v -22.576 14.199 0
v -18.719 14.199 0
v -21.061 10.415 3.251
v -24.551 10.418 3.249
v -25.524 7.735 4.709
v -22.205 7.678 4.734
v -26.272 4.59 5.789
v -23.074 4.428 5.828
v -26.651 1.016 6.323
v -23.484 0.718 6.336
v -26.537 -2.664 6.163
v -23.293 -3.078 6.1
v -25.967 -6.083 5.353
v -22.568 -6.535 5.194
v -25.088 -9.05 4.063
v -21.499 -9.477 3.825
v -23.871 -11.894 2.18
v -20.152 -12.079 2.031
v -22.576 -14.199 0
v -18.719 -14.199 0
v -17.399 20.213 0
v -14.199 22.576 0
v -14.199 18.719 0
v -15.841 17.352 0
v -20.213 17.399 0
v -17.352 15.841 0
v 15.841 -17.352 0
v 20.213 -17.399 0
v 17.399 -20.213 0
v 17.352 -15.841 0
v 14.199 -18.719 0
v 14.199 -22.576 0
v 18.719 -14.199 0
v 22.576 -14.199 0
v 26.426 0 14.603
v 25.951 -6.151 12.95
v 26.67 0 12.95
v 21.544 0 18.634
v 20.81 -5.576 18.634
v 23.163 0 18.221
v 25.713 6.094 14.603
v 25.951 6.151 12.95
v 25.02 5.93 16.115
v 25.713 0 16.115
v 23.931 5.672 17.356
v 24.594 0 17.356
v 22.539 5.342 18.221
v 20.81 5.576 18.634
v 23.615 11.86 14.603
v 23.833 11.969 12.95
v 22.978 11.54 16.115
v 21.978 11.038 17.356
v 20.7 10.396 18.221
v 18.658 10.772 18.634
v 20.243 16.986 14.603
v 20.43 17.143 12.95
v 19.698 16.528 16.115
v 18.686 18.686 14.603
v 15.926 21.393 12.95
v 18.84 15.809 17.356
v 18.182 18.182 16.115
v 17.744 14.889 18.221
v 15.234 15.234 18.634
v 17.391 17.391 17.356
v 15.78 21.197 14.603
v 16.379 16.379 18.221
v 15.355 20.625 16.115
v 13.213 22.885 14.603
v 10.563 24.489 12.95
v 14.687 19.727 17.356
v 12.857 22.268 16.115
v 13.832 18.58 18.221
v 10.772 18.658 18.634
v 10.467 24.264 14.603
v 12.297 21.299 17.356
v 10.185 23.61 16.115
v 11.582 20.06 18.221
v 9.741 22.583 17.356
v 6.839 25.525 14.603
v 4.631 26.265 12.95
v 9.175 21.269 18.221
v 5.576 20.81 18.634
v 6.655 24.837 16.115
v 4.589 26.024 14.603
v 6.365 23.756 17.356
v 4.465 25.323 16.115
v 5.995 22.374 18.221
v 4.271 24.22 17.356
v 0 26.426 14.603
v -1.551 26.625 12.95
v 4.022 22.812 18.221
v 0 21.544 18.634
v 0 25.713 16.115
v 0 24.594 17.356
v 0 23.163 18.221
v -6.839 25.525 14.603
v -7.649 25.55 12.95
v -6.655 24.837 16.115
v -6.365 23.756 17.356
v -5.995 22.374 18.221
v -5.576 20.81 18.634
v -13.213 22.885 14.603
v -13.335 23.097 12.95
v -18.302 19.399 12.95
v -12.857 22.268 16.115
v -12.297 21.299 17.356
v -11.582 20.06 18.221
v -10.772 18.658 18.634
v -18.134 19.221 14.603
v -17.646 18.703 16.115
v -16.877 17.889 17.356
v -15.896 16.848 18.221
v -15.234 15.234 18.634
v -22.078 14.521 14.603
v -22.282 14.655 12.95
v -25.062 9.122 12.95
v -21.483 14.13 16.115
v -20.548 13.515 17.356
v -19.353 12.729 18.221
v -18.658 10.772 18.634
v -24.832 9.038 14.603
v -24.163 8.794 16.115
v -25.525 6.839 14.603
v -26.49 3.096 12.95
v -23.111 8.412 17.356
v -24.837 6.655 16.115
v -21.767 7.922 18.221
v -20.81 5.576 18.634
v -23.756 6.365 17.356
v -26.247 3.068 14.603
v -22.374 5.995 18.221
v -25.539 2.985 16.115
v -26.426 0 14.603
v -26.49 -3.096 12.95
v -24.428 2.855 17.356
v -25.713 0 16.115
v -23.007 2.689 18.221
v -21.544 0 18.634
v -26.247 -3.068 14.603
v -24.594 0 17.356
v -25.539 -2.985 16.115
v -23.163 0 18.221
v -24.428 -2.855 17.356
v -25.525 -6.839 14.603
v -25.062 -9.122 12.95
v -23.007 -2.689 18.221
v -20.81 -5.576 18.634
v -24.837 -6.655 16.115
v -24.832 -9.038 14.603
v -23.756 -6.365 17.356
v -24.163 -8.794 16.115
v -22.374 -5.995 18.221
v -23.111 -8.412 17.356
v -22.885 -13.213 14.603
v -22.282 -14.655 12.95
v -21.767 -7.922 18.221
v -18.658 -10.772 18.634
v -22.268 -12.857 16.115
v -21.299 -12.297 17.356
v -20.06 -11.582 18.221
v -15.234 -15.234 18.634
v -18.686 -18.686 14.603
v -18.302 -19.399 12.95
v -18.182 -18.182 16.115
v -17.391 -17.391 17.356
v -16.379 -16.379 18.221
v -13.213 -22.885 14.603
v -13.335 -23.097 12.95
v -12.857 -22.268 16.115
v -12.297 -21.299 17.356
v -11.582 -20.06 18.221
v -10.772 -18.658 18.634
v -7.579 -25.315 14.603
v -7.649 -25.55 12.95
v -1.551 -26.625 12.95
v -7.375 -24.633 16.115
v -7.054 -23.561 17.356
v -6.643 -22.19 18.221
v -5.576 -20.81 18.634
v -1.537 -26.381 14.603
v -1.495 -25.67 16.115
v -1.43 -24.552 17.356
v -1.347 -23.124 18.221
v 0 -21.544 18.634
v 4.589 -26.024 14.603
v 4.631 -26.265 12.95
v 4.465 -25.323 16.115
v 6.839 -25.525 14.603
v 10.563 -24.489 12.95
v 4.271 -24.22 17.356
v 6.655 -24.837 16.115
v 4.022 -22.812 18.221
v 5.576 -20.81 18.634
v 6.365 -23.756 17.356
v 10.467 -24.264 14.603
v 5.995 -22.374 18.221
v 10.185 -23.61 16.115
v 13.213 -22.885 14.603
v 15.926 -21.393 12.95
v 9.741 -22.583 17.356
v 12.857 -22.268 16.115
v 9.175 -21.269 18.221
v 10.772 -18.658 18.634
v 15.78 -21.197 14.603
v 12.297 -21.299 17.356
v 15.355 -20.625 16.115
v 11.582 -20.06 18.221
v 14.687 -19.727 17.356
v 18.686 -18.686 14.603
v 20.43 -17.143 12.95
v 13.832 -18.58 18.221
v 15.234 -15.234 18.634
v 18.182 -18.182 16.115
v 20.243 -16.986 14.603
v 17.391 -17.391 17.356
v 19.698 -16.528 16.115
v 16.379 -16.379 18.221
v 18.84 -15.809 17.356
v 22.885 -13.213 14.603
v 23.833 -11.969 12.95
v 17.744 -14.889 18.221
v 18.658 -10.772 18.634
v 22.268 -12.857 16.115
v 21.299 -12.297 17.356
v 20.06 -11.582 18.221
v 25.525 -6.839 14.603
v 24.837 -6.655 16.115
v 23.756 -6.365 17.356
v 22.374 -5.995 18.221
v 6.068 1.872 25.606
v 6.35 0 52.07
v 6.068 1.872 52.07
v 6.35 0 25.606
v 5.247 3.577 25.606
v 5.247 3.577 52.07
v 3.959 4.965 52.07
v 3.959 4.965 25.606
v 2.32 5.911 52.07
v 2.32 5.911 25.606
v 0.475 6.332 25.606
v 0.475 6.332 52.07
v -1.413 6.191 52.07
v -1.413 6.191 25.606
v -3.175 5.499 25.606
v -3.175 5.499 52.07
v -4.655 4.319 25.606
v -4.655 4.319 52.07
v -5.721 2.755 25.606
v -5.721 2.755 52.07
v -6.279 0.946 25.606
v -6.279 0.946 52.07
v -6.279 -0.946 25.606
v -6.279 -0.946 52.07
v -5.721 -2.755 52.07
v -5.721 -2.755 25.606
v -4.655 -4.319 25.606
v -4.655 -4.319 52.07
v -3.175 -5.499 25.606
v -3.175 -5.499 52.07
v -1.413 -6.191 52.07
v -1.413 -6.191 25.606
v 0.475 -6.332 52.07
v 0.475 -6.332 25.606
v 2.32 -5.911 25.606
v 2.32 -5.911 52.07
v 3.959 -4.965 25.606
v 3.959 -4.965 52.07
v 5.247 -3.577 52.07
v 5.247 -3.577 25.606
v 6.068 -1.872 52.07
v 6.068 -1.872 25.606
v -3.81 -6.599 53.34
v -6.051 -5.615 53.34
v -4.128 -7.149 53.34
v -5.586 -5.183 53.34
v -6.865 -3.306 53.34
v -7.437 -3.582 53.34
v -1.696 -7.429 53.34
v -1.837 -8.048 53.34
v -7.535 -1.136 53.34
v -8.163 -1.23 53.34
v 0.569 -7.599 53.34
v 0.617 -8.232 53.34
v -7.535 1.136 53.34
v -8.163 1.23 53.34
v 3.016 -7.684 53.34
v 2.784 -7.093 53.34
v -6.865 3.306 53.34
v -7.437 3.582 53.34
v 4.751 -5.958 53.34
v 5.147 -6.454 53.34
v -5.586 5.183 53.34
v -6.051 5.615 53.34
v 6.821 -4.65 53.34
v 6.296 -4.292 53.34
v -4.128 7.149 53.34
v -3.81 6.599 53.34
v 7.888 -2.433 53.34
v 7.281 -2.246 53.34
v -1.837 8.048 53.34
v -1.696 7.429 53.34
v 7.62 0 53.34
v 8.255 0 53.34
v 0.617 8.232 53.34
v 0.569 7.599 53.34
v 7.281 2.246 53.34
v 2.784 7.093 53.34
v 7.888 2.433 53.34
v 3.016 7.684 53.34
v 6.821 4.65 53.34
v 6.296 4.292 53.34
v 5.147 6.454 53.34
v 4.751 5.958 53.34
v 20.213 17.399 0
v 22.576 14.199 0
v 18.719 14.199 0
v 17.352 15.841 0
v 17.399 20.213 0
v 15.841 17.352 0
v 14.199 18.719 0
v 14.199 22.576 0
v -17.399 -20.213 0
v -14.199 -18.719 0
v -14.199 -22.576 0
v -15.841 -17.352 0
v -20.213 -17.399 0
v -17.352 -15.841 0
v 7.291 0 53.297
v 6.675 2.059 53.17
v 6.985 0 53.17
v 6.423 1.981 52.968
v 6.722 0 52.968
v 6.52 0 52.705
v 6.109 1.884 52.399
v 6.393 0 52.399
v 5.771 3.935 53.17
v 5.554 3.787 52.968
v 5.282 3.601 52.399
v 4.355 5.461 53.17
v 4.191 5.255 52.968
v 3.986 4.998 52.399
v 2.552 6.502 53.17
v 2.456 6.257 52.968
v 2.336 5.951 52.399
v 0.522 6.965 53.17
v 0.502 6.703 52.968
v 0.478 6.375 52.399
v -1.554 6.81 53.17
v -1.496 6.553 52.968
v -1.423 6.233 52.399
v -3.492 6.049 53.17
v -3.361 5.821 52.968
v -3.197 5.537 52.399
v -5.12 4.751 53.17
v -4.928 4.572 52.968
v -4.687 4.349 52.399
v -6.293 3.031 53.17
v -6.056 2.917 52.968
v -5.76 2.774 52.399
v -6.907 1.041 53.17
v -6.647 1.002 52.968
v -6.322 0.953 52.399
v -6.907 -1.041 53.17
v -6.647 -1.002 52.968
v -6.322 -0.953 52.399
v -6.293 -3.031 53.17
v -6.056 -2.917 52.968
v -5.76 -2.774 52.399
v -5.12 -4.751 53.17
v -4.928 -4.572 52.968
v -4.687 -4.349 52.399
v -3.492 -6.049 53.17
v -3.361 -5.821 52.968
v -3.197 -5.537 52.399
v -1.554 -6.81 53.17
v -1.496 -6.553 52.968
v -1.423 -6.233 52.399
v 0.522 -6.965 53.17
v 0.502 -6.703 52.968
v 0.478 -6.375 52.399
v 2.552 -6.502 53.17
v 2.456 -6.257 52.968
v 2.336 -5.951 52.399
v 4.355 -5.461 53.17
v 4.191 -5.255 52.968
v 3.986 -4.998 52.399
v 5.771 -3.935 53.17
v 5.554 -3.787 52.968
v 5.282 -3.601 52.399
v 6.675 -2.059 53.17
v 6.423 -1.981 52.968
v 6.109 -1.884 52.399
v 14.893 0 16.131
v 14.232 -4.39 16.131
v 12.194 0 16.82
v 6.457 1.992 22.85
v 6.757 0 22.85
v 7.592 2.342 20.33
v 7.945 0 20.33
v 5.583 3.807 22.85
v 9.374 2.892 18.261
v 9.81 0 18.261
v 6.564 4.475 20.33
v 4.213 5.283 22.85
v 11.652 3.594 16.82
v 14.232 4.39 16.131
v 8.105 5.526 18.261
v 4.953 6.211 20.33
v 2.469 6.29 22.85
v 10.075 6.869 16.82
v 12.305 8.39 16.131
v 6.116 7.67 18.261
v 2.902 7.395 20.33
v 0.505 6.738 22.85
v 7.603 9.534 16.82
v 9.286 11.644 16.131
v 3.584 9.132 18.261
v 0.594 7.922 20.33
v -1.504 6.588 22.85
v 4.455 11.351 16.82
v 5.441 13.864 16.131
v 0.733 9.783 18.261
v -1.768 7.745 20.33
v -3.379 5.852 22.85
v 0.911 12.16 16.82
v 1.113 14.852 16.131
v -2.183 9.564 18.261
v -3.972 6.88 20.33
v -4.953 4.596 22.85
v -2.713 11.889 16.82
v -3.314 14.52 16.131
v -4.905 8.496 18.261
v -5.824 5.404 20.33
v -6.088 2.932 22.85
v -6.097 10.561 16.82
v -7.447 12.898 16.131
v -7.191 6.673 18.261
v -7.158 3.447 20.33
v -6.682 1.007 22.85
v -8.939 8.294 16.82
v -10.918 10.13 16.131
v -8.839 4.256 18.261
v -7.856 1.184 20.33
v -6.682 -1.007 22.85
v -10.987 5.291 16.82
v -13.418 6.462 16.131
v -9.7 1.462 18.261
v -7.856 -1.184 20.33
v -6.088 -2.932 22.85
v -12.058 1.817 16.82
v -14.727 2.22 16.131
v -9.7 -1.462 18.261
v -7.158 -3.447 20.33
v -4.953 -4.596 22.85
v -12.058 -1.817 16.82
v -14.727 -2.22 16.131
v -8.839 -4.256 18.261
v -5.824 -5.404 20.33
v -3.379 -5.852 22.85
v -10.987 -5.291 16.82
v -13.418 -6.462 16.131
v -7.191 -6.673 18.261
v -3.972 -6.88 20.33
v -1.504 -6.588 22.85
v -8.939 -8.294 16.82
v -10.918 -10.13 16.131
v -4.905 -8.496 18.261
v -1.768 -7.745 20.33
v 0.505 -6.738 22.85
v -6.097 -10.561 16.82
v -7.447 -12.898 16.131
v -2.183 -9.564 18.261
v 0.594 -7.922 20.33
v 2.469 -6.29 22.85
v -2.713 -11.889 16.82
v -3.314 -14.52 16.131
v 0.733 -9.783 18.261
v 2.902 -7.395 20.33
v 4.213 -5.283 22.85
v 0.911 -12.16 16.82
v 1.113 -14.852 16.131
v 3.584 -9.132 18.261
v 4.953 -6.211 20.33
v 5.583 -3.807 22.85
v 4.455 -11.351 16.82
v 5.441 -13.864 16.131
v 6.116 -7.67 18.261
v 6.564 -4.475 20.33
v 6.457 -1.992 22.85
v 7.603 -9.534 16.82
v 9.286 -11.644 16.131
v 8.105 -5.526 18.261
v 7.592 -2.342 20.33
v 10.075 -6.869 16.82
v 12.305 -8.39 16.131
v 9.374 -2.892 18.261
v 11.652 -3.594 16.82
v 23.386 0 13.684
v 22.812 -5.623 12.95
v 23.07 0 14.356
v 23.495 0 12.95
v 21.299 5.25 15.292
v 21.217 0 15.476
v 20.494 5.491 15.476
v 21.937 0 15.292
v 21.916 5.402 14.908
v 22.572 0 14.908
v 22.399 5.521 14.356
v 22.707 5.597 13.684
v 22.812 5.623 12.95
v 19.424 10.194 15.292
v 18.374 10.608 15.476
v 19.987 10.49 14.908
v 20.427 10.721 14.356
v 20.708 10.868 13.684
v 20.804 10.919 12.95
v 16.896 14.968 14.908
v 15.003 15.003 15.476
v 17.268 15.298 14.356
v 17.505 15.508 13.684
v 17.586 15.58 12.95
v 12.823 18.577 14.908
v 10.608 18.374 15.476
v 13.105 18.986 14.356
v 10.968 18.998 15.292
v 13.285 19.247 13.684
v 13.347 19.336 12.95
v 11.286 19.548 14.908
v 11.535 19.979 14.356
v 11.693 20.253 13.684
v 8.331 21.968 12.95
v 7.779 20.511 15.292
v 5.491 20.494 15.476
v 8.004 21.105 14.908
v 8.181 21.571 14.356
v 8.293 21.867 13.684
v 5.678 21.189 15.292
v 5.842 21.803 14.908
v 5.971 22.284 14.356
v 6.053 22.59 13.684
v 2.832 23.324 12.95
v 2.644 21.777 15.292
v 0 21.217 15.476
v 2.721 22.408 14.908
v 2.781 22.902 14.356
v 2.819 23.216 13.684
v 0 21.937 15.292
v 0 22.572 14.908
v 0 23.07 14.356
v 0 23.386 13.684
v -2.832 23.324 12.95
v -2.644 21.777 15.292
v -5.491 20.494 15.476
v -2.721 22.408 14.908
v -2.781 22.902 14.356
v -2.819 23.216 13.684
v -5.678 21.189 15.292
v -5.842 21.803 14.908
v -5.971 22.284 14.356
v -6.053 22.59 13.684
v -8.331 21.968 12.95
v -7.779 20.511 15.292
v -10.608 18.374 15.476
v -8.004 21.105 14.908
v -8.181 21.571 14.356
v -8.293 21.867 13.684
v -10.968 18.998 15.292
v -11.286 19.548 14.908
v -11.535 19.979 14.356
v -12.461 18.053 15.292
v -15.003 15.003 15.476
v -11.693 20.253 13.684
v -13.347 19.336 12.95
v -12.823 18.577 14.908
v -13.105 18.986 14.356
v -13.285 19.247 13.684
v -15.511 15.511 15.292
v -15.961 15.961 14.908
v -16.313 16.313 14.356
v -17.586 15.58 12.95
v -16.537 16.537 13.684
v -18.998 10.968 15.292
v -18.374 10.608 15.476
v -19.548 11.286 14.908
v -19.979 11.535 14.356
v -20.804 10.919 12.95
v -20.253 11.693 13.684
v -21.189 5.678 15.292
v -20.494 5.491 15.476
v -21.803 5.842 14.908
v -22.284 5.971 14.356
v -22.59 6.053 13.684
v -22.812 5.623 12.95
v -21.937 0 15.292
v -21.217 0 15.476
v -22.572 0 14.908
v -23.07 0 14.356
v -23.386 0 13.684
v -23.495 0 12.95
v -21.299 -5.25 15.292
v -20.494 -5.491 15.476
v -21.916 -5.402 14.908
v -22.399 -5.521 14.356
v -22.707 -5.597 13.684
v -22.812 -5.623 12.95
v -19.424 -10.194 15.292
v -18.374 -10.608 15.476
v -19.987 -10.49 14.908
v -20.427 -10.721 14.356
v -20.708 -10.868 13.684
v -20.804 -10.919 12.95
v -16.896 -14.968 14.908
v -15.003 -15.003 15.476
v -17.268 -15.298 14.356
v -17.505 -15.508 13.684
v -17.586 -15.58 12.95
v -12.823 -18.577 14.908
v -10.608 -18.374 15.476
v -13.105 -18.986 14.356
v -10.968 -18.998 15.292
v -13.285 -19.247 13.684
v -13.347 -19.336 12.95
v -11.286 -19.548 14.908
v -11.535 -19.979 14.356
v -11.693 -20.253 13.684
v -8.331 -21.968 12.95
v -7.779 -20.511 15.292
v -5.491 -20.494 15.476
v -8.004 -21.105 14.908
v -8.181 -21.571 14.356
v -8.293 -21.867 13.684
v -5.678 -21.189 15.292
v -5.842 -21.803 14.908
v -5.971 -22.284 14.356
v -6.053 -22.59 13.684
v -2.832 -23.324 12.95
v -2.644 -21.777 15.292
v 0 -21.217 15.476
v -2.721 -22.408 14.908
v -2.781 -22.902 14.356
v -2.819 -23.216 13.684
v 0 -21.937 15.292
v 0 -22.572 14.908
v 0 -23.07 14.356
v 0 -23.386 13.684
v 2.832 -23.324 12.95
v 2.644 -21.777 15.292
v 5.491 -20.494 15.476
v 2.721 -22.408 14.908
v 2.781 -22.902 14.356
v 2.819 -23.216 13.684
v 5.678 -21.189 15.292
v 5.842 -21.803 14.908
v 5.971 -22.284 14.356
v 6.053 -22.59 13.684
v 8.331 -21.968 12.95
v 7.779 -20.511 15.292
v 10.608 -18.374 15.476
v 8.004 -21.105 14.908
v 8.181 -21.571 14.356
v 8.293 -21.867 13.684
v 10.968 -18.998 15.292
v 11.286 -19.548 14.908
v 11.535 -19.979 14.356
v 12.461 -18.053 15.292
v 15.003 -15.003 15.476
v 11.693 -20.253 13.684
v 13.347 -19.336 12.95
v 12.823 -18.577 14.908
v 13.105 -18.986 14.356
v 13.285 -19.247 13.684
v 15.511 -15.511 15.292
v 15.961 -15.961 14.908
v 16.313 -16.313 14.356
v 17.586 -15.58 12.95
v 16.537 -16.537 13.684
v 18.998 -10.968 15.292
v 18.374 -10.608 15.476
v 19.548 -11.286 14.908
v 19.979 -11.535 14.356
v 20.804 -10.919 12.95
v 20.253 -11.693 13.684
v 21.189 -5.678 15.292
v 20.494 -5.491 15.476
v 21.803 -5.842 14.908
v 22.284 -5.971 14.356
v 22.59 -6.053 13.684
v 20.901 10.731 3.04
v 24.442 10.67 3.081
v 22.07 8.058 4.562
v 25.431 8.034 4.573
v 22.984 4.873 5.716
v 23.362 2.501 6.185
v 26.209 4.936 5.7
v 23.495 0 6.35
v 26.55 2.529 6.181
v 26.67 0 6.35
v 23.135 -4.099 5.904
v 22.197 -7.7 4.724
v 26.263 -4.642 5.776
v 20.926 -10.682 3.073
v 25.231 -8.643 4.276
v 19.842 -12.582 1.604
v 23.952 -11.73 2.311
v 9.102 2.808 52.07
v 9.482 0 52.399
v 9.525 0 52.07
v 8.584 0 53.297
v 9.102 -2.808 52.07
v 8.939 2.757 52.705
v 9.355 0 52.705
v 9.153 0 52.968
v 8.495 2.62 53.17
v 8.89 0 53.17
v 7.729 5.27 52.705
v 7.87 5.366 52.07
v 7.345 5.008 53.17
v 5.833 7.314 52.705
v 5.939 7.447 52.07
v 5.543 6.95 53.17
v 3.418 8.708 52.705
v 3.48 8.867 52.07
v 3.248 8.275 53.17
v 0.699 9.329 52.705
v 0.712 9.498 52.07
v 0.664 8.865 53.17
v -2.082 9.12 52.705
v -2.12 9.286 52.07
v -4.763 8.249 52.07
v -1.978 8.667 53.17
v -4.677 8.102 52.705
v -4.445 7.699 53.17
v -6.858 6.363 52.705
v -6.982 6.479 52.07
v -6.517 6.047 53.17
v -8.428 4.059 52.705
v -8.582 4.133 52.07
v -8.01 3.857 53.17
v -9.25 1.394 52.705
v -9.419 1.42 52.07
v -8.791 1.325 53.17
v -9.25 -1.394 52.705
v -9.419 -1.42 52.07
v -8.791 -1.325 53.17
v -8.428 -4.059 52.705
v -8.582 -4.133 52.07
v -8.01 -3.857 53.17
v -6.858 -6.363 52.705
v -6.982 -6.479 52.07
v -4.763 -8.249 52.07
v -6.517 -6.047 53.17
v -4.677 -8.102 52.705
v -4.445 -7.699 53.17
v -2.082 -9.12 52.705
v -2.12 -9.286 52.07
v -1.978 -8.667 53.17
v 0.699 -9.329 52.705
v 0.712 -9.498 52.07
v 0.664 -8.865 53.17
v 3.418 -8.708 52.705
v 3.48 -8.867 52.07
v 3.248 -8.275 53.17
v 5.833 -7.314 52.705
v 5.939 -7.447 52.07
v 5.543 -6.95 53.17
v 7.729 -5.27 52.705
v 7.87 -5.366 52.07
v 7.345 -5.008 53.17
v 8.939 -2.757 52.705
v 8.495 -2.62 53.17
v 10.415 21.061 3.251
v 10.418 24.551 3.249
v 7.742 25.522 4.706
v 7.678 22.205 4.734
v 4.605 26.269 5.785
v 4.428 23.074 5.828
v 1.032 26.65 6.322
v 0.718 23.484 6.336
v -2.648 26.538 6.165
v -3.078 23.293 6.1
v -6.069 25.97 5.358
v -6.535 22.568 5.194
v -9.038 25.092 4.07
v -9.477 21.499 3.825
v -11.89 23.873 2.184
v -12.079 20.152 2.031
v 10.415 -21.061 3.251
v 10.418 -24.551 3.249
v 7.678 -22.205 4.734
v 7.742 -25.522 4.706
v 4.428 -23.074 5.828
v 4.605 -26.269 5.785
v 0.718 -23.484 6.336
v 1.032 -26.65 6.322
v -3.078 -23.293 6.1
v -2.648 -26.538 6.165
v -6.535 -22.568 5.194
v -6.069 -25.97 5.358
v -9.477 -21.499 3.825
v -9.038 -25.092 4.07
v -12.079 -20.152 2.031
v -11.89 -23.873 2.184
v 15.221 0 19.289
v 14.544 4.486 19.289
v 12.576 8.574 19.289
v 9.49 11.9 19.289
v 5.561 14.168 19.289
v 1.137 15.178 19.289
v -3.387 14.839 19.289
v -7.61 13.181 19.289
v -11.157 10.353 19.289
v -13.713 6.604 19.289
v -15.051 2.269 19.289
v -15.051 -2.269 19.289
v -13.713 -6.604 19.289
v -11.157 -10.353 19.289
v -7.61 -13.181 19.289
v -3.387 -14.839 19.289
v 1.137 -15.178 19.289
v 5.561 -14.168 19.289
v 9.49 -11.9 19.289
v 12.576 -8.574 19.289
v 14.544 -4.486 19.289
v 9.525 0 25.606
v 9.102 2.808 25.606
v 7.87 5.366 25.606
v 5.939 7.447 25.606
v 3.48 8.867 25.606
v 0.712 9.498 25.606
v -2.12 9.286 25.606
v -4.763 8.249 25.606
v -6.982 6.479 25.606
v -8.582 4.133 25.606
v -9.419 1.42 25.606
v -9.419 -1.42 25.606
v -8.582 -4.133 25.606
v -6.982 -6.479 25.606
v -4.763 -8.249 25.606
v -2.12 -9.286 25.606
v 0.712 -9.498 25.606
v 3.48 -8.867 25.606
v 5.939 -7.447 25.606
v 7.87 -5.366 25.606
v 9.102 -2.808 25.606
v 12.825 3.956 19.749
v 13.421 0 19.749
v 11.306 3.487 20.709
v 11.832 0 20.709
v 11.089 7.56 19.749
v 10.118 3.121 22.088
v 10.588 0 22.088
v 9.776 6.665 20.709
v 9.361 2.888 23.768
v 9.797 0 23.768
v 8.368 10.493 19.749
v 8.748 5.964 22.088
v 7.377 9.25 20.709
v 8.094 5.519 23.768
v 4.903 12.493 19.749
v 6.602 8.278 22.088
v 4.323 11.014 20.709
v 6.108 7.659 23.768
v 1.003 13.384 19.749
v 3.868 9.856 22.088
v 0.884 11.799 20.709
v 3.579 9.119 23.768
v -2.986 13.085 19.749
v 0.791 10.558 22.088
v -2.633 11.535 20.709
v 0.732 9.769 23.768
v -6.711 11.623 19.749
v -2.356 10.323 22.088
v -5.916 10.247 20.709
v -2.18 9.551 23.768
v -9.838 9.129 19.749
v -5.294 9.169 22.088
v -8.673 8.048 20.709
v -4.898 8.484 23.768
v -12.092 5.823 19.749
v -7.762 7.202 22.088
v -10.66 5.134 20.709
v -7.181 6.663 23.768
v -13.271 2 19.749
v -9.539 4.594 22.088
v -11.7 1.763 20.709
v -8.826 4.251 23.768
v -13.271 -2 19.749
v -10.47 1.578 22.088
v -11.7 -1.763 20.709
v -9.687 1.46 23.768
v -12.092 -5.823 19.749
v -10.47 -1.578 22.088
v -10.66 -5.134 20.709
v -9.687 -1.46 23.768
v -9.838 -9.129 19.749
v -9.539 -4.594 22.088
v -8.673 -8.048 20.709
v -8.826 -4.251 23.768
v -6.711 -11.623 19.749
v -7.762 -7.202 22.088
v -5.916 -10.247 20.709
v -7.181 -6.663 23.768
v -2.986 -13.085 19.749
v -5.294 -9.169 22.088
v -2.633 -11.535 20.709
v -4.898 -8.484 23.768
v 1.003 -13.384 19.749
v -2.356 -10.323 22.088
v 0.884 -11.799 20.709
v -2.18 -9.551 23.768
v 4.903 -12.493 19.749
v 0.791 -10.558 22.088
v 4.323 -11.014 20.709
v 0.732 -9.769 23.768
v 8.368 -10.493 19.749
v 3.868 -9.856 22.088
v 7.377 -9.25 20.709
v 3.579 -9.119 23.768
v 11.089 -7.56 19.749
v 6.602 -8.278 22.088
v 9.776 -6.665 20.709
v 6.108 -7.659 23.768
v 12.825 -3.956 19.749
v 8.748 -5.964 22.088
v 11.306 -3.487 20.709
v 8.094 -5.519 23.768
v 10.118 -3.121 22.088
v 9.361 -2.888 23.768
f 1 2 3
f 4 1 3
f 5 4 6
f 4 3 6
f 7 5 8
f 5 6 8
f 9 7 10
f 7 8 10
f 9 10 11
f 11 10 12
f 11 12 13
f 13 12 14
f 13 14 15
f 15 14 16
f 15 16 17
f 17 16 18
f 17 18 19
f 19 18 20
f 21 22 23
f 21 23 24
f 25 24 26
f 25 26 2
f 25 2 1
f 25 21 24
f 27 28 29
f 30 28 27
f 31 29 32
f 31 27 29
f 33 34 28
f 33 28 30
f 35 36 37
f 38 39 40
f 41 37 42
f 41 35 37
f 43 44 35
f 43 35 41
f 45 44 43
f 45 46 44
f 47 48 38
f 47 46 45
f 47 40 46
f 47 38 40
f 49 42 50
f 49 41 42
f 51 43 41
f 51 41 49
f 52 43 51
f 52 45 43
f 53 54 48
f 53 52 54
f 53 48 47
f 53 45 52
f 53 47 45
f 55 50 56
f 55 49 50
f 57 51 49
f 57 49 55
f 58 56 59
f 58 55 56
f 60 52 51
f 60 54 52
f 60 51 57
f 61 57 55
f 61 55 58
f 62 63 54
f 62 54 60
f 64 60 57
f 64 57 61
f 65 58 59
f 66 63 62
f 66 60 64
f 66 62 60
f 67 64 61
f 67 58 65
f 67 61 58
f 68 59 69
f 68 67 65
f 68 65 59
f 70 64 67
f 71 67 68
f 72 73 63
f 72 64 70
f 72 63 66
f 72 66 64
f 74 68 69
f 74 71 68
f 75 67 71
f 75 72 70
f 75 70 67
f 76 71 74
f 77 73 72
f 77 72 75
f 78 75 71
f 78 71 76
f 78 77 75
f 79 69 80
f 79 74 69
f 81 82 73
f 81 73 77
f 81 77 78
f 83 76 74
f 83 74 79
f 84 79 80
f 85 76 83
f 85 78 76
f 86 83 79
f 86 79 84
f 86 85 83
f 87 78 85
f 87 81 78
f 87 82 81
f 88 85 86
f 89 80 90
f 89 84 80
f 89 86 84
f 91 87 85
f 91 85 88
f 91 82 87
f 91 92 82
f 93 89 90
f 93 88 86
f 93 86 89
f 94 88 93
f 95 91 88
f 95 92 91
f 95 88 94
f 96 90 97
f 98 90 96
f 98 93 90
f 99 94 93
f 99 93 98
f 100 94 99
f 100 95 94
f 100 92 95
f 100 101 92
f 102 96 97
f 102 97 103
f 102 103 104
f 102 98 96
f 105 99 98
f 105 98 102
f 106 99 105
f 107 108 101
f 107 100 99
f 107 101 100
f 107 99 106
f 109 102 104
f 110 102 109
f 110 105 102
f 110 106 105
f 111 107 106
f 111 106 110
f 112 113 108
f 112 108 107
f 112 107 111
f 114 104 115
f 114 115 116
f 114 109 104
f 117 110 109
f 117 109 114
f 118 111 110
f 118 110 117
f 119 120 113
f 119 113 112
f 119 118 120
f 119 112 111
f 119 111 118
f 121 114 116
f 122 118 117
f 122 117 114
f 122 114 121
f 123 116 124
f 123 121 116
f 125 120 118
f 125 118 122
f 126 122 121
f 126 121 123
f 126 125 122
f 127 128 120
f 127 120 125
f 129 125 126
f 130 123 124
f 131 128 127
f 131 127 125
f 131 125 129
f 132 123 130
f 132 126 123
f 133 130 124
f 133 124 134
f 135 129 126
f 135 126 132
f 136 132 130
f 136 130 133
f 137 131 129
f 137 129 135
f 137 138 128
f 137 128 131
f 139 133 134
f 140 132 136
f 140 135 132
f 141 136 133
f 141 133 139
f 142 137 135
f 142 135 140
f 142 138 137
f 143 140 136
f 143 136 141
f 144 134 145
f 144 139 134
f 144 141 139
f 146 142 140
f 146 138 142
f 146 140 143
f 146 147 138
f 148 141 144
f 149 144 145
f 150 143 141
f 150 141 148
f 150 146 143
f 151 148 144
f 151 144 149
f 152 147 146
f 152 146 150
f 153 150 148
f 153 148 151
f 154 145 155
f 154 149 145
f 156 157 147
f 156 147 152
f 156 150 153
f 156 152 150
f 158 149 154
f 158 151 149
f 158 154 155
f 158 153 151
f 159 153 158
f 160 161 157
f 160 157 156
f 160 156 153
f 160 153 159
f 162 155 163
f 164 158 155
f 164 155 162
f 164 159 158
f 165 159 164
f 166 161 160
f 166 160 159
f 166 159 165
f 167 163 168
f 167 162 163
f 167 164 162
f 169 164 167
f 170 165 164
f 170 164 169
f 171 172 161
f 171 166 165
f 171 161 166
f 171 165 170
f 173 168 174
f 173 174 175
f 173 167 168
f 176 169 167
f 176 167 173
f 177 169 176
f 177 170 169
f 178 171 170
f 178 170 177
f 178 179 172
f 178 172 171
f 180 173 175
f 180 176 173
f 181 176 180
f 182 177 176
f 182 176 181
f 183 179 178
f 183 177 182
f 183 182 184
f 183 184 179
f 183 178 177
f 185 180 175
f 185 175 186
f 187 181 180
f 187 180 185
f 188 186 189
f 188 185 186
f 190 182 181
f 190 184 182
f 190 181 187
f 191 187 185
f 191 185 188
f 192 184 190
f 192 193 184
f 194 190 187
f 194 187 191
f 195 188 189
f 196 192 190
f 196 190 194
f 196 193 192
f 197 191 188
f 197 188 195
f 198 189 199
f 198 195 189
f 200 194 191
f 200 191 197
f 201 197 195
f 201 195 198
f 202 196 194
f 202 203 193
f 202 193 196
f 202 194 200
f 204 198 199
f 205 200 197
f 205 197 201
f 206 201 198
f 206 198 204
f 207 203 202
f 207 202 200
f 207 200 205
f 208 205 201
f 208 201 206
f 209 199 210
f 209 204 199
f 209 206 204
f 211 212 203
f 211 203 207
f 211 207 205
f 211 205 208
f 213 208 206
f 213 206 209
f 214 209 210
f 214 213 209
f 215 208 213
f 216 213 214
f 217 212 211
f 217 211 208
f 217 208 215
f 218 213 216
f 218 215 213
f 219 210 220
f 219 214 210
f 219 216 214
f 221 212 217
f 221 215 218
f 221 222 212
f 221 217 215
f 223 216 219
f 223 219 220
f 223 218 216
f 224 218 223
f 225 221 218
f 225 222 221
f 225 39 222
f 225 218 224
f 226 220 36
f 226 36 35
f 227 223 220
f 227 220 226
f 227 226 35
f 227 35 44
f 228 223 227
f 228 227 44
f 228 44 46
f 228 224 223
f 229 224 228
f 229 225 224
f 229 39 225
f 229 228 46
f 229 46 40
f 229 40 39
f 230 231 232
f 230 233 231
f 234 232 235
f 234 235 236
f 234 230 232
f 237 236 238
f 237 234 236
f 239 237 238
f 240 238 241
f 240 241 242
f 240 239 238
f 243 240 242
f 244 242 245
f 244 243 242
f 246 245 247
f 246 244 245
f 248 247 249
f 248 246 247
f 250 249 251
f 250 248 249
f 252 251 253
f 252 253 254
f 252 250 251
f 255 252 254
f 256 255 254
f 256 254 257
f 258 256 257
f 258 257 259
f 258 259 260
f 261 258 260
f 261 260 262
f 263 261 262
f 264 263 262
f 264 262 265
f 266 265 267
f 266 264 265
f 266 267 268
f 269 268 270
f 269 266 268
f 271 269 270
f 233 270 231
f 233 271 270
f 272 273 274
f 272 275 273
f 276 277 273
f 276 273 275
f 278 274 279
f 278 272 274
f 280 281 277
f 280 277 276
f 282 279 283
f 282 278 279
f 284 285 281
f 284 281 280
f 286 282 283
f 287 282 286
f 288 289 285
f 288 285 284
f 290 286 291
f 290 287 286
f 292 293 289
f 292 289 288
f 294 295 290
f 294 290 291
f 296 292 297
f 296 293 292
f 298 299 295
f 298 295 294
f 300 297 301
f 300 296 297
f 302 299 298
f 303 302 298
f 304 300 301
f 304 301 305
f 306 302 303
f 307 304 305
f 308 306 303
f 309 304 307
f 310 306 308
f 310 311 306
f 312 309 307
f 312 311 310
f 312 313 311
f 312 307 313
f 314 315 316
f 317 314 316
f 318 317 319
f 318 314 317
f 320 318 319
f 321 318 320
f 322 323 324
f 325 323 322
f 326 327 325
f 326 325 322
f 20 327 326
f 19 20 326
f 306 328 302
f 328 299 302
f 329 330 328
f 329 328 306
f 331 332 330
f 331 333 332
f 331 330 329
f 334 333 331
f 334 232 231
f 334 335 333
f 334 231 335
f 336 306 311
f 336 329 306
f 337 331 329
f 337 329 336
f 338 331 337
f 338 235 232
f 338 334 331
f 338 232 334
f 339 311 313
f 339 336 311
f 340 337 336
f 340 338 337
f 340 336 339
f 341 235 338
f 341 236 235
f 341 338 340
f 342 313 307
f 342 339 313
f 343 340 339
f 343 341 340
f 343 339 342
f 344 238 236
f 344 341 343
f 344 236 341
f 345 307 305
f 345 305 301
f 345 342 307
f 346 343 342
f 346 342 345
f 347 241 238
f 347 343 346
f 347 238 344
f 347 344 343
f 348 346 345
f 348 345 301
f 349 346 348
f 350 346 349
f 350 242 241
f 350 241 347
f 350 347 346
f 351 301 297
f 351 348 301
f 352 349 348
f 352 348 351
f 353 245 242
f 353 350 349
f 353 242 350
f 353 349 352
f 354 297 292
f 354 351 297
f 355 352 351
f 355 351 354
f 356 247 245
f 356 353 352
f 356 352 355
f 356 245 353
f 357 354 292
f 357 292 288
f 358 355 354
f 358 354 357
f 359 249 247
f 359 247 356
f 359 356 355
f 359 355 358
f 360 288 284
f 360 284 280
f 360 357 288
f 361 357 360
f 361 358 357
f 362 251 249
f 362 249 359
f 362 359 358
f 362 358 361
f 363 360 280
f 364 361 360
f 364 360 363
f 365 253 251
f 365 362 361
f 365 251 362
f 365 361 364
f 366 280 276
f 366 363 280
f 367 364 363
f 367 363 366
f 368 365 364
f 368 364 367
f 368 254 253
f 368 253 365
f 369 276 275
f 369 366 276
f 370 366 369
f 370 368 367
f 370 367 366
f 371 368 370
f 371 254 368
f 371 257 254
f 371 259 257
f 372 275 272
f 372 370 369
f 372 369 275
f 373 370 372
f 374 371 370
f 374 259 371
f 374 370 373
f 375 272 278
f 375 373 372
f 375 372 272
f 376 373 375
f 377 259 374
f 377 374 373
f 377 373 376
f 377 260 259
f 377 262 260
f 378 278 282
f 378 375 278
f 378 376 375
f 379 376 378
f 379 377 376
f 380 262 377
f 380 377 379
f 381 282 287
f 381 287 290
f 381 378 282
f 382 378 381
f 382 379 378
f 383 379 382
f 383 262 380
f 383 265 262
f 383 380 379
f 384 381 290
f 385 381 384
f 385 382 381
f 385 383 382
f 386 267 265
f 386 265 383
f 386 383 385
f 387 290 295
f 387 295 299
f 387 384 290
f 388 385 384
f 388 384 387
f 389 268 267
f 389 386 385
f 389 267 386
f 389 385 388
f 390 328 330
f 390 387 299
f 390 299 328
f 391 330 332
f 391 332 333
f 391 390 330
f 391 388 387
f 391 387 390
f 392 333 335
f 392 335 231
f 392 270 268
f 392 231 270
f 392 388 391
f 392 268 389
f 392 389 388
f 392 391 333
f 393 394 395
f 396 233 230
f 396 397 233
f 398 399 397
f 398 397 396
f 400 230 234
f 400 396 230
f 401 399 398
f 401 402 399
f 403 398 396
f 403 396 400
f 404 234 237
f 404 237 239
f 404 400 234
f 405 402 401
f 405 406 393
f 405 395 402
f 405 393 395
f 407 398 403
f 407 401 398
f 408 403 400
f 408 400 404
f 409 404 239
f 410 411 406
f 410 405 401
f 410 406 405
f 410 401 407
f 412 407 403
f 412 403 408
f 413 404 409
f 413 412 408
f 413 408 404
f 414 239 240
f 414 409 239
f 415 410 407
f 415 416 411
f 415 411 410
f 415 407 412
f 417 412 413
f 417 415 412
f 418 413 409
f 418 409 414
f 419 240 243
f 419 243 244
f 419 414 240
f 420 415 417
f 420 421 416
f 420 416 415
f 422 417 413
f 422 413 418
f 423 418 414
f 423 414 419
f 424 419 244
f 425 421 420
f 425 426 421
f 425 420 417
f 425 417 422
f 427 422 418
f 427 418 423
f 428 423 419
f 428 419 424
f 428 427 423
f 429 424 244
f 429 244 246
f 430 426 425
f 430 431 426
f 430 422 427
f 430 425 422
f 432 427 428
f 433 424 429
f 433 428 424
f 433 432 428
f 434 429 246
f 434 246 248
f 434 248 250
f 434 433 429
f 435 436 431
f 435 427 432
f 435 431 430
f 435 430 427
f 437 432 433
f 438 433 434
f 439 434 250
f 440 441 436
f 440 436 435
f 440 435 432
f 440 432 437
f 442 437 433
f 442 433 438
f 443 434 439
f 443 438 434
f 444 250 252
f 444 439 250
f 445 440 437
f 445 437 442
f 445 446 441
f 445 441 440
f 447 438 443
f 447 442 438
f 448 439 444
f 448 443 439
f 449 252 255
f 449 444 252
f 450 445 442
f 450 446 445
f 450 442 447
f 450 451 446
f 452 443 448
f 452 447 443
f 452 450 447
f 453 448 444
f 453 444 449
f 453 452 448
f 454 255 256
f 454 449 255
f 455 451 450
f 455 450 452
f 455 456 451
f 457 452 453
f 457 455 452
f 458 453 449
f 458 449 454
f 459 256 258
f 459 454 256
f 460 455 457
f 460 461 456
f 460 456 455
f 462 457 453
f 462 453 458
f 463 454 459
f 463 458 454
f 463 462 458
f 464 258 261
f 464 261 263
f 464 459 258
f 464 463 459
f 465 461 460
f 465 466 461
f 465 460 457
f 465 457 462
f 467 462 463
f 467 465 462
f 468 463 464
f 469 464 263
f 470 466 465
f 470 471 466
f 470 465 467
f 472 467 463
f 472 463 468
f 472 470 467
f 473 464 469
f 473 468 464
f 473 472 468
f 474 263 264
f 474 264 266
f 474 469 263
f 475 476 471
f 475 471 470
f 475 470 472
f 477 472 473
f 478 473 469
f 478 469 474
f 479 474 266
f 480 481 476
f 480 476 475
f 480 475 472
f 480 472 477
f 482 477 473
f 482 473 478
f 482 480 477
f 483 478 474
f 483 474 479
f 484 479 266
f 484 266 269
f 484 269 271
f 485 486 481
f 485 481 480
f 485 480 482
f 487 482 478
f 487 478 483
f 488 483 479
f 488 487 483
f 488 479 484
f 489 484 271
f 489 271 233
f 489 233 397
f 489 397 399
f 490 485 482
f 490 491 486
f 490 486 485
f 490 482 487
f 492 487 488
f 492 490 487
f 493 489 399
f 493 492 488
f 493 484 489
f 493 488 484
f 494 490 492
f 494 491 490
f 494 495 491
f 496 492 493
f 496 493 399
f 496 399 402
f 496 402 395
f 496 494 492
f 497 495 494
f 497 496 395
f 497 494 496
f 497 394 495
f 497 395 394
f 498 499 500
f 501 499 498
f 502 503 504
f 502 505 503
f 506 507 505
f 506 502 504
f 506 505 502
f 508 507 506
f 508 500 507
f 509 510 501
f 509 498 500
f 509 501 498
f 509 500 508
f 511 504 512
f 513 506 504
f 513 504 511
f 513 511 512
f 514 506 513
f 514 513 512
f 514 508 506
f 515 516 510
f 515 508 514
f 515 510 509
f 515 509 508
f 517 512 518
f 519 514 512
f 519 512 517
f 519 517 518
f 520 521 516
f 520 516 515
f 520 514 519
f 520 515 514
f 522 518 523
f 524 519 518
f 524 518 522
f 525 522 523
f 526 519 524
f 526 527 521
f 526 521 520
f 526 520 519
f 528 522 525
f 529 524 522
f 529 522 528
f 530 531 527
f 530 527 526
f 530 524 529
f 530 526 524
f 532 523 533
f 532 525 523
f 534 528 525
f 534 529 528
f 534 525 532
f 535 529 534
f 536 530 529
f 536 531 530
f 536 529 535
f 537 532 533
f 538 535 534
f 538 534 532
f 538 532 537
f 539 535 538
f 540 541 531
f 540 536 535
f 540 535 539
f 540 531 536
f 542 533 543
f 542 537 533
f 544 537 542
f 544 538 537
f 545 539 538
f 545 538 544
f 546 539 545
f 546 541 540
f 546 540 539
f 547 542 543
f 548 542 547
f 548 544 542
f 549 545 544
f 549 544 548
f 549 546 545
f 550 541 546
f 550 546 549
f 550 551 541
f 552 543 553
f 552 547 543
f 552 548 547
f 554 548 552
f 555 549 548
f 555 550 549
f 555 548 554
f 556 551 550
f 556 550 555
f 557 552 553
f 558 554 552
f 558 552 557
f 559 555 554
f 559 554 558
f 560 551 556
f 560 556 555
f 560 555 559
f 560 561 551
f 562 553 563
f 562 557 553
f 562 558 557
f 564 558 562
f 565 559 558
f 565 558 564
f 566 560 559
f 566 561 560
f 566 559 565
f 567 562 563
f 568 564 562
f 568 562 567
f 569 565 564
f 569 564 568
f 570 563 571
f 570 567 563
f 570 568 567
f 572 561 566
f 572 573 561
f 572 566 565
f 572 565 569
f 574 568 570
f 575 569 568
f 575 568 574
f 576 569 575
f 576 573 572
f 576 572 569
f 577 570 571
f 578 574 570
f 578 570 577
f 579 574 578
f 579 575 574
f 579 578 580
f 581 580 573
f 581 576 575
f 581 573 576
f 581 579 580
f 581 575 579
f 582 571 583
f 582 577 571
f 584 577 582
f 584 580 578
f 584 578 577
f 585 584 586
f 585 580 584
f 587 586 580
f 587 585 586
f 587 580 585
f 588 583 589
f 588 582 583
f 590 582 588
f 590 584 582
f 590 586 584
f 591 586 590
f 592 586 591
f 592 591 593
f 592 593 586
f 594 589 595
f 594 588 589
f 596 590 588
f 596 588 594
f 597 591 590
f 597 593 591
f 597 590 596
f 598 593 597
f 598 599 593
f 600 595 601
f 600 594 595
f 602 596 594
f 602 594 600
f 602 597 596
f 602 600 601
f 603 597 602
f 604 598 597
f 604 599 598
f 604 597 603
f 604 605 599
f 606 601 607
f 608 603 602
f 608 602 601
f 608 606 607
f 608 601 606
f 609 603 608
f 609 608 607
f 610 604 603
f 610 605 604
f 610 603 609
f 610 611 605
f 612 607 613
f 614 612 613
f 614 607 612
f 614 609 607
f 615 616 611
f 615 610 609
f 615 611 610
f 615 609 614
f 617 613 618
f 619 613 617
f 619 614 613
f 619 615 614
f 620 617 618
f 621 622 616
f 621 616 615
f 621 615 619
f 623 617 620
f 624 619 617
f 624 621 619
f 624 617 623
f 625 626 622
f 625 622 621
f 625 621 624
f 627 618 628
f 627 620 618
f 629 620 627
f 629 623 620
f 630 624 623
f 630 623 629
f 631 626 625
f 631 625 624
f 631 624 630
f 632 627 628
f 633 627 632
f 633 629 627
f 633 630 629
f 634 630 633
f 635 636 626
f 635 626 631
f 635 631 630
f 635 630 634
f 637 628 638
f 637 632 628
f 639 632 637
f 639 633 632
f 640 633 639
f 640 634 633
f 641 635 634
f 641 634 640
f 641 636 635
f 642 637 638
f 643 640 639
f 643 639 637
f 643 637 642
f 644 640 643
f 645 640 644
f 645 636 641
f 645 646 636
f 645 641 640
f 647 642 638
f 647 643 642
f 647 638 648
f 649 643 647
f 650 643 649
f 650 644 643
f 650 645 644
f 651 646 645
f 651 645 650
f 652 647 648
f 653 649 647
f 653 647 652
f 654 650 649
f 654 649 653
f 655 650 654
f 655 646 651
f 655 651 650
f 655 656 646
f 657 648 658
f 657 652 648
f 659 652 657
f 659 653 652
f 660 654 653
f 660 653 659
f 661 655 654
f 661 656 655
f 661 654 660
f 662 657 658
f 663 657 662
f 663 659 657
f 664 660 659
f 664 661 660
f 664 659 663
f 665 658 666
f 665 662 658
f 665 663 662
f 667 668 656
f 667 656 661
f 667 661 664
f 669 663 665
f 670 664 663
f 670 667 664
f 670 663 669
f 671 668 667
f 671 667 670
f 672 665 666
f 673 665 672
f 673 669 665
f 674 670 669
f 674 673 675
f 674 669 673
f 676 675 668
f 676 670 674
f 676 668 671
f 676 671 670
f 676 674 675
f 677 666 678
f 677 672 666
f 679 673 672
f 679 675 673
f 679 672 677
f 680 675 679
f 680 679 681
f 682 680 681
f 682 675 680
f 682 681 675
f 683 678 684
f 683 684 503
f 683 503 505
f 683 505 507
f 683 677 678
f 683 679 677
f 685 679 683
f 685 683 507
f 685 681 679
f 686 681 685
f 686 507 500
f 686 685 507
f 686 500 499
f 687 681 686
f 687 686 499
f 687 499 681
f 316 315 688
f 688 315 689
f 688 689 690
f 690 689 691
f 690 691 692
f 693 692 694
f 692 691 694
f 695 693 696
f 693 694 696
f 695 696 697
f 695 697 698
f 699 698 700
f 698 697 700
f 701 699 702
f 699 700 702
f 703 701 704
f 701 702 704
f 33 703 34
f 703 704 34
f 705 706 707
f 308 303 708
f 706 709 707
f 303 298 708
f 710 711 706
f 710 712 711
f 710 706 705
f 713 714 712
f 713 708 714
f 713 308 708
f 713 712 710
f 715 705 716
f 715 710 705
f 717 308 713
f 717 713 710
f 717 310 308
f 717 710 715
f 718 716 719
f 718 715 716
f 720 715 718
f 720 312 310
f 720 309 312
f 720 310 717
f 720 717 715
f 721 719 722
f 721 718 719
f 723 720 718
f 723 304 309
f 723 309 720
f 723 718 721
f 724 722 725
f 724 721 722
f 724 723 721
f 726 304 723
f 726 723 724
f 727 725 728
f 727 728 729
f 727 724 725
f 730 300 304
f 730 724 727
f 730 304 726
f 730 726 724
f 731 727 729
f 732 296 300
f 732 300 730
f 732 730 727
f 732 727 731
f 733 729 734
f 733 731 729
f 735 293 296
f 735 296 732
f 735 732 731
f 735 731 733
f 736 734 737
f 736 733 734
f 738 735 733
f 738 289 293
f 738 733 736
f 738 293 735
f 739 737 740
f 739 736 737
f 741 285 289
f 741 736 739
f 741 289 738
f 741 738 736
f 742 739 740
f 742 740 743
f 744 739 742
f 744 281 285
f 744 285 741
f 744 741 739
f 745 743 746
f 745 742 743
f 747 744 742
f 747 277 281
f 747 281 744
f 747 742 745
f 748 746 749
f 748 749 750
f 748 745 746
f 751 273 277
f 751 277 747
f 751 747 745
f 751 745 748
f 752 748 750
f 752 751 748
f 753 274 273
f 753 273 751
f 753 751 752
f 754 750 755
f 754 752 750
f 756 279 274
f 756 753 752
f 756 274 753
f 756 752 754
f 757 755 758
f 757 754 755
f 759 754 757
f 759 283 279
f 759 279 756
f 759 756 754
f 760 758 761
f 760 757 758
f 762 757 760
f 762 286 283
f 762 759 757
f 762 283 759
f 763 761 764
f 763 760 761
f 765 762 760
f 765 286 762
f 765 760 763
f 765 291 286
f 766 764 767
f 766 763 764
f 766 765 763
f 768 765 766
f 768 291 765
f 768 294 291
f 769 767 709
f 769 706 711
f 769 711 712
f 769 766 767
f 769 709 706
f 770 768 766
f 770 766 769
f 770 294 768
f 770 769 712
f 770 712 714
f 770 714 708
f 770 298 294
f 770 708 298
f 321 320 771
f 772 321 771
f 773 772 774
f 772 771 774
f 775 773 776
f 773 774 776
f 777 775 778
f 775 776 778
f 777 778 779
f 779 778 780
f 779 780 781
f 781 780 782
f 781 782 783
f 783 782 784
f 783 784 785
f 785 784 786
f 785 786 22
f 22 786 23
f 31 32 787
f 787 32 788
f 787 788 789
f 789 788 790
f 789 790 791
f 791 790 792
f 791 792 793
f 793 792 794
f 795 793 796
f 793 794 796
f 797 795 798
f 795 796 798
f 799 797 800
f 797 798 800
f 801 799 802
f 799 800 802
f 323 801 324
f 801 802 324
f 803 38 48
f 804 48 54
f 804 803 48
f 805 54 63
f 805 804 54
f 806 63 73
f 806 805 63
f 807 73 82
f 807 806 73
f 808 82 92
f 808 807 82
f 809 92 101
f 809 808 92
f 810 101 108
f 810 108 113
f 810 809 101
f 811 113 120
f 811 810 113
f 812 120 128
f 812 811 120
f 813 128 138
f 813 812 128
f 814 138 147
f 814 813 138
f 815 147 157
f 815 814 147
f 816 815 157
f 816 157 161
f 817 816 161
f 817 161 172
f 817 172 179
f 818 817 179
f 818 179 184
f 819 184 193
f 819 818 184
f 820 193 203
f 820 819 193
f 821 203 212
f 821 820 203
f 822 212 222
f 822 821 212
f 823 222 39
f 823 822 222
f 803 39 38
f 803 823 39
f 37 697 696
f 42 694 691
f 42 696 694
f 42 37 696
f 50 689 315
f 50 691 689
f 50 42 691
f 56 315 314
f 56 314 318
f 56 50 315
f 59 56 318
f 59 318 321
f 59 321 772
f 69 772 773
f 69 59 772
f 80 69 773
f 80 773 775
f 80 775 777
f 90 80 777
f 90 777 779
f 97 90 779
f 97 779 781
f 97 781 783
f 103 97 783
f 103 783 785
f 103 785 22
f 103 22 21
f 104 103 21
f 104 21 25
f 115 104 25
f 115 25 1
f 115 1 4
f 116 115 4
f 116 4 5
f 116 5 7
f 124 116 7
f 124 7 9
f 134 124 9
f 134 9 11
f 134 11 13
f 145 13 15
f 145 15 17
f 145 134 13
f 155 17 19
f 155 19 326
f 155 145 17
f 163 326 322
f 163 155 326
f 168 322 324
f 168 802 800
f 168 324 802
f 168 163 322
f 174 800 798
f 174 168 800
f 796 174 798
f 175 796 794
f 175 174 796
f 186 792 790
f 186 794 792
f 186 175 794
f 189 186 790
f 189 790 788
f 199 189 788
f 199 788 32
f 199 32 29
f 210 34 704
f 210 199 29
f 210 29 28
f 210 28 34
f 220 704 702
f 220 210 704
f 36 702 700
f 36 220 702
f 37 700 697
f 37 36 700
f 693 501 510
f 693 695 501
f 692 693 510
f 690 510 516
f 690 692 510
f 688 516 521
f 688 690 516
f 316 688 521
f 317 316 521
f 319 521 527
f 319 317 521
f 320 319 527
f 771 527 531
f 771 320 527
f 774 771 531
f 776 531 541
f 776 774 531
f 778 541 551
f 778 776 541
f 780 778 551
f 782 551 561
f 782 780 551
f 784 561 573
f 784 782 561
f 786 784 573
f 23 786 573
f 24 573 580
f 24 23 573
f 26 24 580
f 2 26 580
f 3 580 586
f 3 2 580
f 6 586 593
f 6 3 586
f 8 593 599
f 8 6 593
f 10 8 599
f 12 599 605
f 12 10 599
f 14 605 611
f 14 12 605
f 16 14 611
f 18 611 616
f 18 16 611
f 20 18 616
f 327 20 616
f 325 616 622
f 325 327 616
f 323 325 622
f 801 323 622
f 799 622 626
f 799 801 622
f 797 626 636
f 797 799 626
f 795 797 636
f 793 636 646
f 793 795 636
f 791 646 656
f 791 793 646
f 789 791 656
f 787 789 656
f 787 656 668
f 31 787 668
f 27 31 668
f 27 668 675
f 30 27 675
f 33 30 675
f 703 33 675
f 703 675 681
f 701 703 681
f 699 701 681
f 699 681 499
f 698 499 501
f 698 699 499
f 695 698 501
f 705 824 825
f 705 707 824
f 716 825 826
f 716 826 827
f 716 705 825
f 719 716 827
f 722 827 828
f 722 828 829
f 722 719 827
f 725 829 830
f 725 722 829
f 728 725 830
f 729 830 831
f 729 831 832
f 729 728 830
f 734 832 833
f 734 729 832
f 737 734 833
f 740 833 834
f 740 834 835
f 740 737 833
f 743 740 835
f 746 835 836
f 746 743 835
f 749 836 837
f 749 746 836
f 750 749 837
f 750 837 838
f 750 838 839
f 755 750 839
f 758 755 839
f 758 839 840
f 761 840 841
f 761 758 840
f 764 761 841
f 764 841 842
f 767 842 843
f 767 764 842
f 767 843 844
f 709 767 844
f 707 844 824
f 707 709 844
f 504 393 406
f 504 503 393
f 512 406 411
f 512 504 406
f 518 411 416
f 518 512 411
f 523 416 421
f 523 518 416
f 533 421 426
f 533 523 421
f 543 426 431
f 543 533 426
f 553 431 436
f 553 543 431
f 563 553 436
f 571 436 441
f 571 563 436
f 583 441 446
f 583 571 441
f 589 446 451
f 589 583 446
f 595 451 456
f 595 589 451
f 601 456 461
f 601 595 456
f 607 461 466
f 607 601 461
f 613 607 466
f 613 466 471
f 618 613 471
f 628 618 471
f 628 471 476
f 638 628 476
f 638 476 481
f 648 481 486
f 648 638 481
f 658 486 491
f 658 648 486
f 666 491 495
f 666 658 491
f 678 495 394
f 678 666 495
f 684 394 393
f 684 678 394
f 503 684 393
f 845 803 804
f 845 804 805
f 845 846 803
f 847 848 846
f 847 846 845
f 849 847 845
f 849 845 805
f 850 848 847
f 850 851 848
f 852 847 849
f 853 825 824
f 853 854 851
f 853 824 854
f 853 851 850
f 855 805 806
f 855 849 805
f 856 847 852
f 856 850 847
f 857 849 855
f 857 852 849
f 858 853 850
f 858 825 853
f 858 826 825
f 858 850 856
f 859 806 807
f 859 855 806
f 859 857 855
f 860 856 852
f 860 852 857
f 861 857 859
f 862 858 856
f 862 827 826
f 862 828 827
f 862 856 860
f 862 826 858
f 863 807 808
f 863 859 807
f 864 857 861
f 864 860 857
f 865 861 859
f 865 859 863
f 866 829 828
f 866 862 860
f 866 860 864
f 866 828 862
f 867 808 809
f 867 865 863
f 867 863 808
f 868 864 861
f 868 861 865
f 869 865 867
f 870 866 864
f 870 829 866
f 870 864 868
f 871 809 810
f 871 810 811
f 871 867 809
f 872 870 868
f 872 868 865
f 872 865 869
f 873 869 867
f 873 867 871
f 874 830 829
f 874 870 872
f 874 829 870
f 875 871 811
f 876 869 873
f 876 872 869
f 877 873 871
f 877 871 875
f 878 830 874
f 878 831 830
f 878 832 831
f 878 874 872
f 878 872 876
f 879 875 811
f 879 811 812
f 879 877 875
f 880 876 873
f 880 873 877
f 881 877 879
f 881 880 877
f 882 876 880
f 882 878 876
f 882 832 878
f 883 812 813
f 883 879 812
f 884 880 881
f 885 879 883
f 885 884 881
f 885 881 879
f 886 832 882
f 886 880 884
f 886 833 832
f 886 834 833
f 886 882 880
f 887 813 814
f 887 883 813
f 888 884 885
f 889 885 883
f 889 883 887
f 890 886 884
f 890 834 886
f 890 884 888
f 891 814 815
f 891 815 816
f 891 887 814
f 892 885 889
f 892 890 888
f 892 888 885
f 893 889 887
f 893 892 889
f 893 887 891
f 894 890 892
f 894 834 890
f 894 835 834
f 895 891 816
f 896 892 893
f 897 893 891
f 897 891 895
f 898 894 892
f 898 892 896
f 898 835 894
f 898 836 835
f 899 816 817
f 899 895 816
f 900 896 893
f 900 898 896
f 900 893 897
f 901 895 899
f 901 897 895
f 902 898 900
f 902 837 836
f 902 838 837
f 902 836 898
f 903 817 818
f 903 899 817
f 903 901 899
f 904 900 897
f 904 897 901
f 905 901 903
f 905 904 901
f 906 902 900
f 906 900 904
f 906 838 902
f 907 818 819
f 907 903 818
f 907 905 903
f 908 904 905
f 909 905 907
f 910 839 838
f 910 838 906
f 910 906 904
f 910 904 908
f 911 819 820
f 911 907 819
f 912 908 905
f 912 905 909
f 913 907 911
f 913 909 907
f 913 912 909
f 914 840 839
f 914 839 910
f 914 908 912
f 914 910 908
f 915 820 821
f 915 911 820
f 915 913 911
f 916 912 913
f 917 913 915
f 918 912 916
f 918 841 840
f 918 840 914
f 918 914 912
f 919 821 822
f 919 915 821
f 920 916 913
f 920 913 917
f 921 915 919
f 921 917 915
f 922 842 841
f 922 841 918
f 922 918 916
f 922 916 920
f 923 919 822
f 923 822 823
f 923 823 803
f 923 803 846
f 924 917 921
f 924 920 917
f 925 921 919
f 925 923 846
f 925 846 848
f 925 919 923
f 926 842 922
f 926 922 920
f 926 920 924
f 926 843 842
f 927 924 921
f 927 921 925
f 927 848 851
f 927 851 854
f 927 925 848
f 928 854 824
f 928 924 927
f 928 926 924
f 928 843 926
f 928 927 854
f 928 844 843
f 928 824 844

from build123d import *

# Parameters (mm, degrees)
F2_R     = 19.05
F3_DEPTH = 38.1
F4_R     = 19.05
F5_DEPTH = 38.1


with BuildPart() as f1:
    # F0 (on Front) → F1 (revolve)
    with BuildSketch(Plane.XZ):
        with BuildLine():
            ThreePointArc((7.62, 53.34), (6.721974, 52.968026), (6.35, 52.07))
            Line((6.35, 52.07), (6.35, 25.605565))
            ThreePointArc((6.35, 25.605565), (8.801233, 19.226893), (14.893296, 16.13129))
            Line((14.893296, 16.13129), (21.216788, 15.476063))
            ThreePointArc((21.216788, 15.476063), (22.841338, 14.650569), (23.495, 12.94959))
            Line((23.495, 12.94959), (23.495, 0))
            Line((23.495, 0), (26.67, 0))
            Line((26.67, 0), (26.67, 12.94959))
            ThreePointArc((26.67, 12.94959), (25.19926, 16.776793), (21.544022, 18.634155))
            Line((21.544022, 18.634155), (15.220531, 19.289381))
            ThreePointArc((15.220531, 19.289381), (11.159155, 21.353117), (9.525, 25.605565))
            Line((9.525, 25.605565), (9.525, 52.07))
            ThreePointArc((9.525, 52.07), (9.153026, 52.968026), (8.255, 53.34))
            Line((8.255, 53.34), (7.62, 53.34))
        make_face()
    revolve(axis=Axis((0, 0, 26.67), (0, 0, 1)))

    # F2 (on Front) → F3 (cut, symmetric)
    with BuildSketch(Plane.XZ):
        with Locations((0, -12.7)):
            Circle(F2_R)
    extrude(amount=F3_DEPTH, both=True, mode=Mode.SUBTRACT)

    # F4 (on Right) → F5 (cut, symmetric)
    with BuildSketch(Plane.YZ):
        with Locations((0, -12.7)):
            Circle(F4_R)
    extrude(amount=F5_DEPTH, both=True, mode=Mode.SUBTRACT)


solid = f1.part
